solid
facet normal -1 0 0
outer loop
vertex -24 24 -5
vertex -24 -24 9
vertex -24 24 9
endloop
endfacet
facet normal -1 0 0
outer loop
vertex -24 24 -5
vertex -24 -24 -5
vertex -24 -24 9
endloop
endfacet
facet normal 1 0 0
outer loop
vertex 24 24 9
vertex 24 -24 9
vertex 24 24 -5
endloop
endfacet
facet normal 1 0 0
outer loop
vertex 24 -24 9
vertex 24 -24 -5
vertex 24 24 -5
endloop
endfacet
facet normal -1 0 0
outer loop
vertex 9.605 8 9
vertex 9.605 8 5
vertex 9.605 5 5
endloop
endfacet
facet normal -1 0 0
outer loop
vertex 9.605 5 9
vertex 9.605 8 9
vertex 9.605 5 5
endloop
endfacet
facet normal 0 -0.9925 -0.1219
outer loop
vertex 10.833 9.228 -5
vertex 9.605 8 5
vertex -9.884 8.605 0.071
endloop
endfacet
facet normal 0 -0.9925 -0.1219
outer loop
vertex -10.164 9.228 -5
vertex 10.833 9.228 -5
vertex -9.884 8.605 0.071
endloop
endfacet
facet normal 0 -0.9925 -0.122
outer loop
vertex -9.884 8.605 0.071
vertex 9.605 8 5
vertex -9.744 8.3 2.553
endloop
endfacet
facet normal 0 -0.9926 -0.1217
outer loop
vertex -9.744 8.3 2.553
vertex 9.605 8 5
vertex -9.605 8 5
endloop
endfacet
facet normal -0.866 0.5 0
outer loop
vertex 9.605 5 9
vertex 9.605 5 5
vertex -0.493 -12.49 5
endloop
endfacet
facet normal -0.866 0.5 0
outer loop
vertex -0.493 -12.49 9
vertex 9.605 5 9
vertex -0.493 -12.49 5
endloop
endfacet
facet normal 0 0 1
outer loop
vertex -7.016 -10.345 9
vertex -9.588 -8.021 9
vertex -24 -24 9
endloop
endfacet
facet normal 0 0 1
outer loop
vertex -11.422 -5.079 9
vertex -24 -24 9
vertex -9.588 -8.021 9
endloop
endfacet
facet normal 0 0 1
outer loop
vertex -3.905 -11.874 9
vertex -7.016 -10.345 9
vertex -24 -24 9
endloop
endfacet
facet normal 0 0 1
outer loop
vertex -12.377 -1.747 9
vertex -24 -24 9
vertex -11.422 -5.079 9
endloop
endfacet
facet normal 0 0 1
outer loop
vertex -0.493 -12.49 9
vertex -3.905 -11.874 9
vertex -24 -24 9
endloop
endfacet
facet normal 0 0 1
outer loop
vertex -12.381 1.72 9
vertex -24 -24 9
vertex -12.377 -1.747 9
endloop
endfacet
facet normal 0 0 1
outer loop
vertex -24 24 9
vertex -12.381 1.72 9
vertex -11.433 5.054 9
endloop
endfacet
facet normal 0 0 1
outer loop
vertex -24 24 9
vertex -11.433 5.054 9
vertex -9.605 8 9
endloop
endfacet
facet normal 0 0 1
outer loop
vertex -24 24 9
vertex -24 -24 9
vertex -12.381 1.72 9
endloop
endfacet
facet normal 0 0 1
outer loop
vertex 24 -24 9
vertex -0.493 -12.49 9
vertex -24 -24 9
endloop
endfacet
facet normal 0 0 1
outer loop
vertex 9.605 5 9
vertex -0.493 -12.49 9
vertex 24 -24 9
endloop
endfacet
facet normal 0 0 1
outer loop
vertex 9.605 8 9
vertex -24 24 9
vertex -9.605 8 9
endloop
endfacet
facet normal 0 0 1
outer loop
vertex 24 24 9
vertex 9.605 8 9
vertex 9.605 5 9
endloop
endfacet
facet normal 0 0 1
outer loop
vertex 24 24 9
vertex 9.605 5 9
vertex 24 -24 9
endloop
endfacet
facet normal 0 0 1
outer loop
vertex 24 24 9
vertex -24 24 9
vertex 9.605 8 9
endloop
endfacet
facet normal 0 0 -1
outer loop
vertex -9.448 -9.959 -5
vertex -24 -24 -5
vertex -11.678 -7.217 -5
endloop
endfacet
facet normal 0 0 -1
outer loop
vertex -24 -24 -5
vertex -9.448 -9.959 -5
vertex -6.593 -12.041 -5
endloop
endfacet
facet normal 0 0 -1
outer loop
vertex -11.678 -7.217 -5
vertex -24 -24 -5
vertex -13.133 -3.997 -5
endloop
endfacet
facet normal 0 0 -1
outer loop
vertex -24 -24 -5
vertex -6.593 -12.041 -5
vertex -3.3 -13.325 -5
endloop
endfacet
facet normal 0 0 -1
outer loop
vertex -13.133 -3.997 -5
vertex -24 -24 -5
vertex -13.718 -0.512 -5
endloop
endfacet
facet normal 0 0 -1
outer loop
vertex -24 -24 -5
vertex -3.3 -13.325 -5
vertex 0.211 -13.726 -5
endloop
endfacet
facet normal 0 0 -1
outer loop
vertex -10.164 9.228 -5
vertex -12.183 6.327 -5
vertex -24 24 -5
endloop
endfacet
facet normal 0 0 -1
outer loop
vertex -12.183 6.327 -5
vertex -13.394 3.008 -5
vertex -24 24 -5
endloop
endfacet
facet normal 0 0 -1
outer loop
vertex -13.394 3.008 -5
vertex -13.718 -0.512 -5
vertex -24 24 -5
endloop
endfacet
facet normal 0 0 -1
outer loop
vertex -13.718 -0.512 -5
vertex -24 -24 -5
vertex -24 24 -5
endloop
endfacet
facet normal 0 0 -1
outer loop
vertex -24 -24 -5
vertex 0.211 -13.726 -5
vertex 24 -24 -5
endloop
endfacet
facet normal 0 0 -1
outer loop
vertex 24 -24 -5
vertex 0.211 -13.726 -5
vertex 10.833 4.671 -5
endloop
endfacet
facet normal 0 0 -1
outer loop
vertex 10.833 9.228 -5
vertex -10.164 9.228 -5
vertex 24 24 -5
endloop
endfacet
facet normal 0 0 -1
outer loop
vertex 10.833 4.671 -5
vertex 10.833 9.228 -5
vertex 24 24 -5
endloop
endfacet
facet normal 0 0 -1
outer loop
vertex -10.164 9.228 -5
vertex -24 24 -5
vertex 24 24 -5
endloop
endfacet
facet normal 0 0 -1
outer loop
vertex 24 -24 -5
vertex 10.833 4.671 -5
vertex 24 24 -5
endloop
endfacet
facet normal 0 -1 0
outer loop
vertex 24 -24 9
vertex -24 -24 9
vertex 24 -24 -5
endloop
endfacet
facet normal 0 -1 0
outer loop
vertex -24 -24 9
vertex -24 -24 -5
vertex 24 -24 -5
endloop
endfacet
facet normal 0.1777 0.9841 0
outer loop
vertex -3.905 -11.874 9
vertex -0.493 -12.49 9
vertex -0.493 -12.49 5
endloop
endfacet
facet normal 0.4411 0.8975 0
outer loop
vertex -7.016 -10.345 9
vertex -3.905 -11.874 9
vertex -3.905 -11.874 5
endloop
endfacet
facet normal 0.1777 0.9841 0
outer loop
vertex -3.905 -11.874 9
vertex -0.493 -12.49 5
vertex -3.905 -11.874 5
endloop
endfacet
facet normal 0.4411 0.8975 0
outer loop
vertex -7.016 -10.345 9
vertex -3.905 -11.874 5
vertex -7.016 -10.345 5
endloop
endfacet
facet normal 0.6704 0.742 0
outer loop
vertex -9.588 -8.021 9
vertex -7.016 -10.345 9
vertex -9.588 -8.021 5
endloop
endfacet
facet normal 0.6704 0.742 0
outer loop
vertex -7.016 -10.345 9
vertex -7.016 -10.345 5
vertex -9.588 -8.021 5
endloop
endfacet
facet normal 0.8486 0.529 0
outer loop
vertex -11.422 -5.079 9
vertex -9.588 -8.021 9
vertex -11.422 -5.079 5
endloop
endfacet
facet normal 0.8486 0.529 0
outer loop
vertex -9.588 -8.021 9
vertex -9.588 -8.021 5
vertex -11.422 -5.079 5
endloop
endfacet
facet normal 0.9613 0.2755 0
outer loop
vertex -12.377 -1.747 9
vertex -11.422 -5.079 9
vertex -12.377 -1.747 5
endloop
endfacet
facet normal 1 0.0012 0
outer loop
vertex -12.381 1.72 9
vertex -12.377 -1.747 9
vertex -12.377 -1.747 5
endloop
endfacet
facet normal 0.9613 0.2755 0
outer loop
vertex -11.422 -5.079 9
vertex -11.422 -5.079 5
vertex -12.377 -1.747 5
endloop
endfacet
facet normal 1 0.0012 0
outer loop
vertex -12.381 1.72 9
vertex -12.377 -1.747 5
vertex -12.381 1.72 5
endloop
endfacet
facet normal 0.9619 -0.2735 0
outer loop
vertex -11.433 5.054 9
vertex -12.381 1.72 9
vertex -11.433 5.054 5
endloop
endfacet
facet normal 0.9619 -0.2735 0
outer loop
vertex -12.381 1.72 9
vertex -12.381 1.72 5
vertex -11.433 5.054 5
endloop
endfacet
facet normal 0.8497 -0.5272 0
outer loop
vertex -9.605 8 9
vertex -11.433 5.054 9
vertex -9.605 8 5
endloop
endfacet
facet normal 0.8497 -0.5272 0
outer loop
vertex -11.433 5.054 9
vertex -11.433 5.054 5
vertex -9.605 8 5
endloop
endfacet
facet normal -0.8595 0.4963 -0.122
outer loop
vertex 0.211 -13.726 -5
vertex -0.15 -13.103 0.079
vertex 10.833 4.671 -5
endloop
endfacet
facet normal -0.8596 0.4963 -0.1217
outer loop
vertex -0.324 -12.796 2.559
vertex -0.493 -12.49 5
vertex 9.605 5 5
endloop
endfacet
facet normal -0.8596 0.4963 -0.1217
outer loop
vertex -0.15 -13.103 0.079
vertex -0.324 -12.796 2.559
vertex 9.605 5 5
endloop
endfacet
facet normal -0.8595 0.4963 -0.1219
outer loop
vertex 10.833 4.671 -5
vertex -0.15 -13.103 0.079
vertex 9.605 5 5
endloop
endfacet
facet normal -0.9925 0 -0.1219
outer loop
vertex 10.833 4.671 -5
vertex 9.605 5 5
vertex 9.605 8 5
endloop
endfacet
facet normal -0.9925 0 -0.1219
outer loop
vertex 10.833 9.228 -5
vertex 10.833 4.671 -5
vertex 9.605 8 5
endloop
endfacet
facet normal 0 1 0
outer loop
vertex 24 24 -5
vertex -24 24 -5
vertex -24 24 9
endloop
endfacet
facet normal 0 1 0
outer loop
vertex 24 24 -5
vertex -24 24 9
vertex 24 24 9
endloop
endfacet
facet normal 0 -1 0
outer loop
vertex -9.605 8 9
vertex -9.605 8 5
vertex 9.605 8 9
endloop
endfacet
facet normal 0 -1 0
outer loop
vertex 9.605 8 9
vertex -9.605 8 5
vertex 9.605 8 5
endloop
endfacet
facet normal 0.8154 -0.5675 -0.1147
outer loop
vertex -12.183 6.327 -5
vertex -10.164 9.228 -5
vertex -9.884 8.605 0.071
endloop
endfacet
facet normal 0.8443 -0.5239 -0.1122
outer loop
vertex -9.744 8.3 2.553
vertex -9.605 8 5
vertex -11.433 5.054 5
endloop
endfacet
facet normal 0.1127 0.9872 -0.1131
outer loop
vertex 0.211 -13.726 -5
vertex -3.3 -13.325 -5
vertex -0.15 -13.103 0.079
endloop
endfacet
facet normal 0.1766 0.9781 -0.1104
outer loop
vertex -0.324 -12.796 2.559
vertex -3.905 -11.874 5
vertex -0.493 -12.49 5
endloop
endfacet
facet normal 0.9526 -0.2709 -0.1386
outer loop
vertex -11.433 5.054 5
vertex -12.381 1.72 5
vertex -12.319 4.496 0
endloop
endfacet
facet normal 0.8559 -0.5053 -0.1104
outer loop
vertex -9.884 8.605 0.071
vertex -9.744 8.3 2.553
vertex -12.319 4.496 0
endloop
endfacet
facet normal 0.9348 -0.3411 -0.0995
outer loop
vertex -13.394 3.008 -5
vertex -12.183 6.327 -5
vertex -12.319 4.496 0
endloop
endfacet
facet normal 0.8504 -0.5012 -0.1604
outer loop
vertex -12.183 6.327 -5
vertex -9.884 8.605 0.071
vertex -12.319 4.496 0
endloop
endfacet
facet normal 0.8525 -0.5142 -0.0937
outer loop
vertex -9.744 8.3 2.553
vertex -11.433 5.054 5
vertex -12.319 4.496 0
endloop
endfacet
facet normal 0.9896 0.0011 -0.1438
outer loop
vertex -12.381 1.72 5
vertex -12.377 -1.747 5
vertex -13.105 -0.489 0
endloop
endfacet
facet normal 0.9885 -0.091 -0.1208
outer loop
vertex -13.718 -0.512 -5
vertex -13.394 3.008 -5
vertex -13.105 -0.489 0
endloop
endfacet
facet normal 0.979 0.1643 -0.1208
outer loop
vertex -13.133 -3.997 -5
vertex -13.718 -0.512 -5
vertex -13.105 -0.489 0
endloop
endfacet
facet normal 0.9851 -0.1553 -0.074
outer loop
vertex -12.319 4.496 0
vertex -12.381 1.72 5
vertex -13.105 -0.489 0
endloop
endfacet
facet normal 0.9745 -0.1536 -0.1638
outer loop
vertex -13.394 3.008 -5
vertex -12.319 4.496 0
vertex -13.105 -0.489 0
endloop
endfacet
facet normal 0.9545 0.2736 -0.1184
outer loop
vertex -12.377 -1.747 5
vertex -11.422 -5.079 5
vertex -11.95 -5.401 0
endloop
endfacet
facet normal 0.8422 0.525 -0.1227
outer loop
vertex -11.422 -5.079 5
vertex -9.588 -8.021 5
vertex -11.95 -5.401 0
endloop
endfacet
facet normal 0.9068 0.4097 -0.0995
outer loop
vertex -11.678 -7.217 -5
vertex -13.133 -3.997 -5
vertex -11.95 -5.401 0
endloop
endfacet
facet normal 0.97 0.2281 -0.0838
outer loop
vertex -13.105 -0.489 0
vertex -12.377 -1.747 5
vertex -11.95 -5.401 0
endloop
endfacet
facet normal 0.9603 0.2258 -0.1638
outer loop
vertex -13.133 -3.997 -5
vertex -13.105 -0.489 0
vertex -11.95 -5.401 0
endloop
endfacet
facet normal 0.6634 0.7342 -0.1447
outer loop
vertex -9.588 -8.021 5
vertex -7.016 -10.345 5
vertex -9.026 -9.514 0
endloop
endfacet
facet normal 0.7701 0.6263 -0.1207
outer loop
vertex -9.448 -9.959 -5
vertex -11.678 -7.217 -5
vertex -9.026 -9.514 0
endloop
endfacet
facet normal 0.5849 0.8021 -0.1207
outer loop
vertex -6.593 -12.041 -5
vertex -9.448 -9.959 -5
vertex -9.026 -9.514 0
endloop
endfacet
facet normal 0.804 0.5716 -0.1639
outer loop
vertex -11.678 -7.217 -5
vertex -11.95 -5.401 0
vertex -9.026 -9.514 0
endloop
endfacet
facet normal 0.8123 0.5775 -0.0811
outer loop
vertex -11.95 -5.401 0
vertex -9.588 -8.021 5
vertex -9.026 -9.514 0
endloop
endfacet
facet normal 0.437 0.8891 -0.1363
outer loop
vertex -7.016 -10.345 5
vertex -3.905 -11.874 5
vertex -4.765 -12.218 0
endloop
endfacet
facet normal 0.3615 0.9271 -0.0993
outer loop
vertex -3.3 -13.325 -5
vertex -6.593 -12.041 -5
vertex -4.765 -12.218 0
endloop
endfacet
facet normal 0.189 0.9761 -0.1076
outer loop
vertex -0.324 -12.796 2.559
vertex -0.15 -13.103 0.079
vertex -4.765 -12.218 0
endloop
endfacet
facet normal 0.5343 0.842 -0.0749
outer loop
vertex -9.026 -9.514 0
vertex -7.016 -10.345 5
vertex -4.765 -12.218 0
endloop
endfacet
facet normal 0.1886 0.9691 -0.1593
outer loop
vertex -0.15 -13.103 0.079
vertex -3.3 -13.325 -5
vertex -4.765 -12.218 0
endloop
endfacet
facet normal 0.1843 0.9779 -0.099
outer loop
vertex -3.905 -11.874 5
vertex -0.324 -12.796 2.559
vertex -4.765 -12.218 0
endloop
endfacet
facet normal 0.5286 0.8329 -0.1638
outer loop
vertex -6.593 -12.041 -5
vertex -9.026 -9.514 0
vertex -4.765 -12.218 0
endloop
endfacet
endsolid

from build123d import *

# Parameters (mm, degrees)
CROQUIS1_W              = 48
CROQUIS1_H              = 48
SALIENTE_EXTRUIR1_DEPTH = 5
CORTAR_EXTRUIR1_DEPTH   = 11
CORTAR_EXTRUIR1_DRAFT   = 7
CROQUIS3_W              = 48
CROQUIS3_H              = 48
SALIENTE_EXTRUIR2_DEPTH = 4


with BuildPart() as part:
    # Croquis1 → Saliente-Extruir1 (new, symmetric)
    with BuildSketch(Plane.XY):
        Rectangle(CROQUIS1_W, CROQUIS1_H)
    extrude(amount=SALIENTE_EXTRUIR1_DEPTH, both=True)


with BuildPart() as cortar_extruir1_tool:
    # Croquis2 → Cortar-Extruir1 (with draft: the straight prism first)
    with BuildSketch(Plane.XY.offset(5)):
        with BuildLine():
            ThreePointArc((-9.604686356, 8), (-11.421696131, -5.078863799), (-0.493320879, -12.490261587))
            Line((-0.493320879, -12.490261587), (9.604686356, 5))
            Line((9.604686356, 5), (9.604686356, 8))
            Line((9.604686356, 8), (-9.604686356, 8))
        make_face()
    extrude(amount=-CORTAR_EXTRUIR1_DEPTH)
    # Cortar-Extruir1: the draft: its side faces are tilted about the plane it starts from
    cortar_extruir1_sides = [cortar_extruir1_tool.faces().sort_by_distance(p)[0] for p in [
        (4.555682738, -3.745130793, -0.5),
        (9.604686356, 6.5, -0.5),
        (0, 8, -0.5),
        (-11.421696131, -5.078863799, -0.5),
    ]]
    draft(cortar_extruir1_sides, Plane.XY.offset(5), CORTAR_EXTRUIR1_DRAFT)


with BuildPart() as part_1:
    add(part.part)

    # Cortar-Extruir1: cut by cortar_extruir1_tool
    add(cortar_extruir1_tool.part, mode=Mode.SUBTRACT)

    # Croquis3 → Saliente-Extruir2 (add)
    with BuildSketch(Plane.XY.offset(5)):
        Rectangle(CROQUIS3_W, CROQUIS3_H)
        with BuildLine():
            Line((9.604686356, 8), (9.604686356, 5))
            Line((9.604686356, 5), (-0.493320879, -12.490261587))
            ThreePointArc((-0.493320879, -12.490261587), (-11.421696131, -5.078863799), (-9.604686356, 8))
            Line((-9.604686356, 8), (9.604686356, 8))
        make_face(mode=Mode.SUBTRACT)
    extrude(amount=SALIENTE_EXTRUIR2_DEPTH)


solid = part_1.part
